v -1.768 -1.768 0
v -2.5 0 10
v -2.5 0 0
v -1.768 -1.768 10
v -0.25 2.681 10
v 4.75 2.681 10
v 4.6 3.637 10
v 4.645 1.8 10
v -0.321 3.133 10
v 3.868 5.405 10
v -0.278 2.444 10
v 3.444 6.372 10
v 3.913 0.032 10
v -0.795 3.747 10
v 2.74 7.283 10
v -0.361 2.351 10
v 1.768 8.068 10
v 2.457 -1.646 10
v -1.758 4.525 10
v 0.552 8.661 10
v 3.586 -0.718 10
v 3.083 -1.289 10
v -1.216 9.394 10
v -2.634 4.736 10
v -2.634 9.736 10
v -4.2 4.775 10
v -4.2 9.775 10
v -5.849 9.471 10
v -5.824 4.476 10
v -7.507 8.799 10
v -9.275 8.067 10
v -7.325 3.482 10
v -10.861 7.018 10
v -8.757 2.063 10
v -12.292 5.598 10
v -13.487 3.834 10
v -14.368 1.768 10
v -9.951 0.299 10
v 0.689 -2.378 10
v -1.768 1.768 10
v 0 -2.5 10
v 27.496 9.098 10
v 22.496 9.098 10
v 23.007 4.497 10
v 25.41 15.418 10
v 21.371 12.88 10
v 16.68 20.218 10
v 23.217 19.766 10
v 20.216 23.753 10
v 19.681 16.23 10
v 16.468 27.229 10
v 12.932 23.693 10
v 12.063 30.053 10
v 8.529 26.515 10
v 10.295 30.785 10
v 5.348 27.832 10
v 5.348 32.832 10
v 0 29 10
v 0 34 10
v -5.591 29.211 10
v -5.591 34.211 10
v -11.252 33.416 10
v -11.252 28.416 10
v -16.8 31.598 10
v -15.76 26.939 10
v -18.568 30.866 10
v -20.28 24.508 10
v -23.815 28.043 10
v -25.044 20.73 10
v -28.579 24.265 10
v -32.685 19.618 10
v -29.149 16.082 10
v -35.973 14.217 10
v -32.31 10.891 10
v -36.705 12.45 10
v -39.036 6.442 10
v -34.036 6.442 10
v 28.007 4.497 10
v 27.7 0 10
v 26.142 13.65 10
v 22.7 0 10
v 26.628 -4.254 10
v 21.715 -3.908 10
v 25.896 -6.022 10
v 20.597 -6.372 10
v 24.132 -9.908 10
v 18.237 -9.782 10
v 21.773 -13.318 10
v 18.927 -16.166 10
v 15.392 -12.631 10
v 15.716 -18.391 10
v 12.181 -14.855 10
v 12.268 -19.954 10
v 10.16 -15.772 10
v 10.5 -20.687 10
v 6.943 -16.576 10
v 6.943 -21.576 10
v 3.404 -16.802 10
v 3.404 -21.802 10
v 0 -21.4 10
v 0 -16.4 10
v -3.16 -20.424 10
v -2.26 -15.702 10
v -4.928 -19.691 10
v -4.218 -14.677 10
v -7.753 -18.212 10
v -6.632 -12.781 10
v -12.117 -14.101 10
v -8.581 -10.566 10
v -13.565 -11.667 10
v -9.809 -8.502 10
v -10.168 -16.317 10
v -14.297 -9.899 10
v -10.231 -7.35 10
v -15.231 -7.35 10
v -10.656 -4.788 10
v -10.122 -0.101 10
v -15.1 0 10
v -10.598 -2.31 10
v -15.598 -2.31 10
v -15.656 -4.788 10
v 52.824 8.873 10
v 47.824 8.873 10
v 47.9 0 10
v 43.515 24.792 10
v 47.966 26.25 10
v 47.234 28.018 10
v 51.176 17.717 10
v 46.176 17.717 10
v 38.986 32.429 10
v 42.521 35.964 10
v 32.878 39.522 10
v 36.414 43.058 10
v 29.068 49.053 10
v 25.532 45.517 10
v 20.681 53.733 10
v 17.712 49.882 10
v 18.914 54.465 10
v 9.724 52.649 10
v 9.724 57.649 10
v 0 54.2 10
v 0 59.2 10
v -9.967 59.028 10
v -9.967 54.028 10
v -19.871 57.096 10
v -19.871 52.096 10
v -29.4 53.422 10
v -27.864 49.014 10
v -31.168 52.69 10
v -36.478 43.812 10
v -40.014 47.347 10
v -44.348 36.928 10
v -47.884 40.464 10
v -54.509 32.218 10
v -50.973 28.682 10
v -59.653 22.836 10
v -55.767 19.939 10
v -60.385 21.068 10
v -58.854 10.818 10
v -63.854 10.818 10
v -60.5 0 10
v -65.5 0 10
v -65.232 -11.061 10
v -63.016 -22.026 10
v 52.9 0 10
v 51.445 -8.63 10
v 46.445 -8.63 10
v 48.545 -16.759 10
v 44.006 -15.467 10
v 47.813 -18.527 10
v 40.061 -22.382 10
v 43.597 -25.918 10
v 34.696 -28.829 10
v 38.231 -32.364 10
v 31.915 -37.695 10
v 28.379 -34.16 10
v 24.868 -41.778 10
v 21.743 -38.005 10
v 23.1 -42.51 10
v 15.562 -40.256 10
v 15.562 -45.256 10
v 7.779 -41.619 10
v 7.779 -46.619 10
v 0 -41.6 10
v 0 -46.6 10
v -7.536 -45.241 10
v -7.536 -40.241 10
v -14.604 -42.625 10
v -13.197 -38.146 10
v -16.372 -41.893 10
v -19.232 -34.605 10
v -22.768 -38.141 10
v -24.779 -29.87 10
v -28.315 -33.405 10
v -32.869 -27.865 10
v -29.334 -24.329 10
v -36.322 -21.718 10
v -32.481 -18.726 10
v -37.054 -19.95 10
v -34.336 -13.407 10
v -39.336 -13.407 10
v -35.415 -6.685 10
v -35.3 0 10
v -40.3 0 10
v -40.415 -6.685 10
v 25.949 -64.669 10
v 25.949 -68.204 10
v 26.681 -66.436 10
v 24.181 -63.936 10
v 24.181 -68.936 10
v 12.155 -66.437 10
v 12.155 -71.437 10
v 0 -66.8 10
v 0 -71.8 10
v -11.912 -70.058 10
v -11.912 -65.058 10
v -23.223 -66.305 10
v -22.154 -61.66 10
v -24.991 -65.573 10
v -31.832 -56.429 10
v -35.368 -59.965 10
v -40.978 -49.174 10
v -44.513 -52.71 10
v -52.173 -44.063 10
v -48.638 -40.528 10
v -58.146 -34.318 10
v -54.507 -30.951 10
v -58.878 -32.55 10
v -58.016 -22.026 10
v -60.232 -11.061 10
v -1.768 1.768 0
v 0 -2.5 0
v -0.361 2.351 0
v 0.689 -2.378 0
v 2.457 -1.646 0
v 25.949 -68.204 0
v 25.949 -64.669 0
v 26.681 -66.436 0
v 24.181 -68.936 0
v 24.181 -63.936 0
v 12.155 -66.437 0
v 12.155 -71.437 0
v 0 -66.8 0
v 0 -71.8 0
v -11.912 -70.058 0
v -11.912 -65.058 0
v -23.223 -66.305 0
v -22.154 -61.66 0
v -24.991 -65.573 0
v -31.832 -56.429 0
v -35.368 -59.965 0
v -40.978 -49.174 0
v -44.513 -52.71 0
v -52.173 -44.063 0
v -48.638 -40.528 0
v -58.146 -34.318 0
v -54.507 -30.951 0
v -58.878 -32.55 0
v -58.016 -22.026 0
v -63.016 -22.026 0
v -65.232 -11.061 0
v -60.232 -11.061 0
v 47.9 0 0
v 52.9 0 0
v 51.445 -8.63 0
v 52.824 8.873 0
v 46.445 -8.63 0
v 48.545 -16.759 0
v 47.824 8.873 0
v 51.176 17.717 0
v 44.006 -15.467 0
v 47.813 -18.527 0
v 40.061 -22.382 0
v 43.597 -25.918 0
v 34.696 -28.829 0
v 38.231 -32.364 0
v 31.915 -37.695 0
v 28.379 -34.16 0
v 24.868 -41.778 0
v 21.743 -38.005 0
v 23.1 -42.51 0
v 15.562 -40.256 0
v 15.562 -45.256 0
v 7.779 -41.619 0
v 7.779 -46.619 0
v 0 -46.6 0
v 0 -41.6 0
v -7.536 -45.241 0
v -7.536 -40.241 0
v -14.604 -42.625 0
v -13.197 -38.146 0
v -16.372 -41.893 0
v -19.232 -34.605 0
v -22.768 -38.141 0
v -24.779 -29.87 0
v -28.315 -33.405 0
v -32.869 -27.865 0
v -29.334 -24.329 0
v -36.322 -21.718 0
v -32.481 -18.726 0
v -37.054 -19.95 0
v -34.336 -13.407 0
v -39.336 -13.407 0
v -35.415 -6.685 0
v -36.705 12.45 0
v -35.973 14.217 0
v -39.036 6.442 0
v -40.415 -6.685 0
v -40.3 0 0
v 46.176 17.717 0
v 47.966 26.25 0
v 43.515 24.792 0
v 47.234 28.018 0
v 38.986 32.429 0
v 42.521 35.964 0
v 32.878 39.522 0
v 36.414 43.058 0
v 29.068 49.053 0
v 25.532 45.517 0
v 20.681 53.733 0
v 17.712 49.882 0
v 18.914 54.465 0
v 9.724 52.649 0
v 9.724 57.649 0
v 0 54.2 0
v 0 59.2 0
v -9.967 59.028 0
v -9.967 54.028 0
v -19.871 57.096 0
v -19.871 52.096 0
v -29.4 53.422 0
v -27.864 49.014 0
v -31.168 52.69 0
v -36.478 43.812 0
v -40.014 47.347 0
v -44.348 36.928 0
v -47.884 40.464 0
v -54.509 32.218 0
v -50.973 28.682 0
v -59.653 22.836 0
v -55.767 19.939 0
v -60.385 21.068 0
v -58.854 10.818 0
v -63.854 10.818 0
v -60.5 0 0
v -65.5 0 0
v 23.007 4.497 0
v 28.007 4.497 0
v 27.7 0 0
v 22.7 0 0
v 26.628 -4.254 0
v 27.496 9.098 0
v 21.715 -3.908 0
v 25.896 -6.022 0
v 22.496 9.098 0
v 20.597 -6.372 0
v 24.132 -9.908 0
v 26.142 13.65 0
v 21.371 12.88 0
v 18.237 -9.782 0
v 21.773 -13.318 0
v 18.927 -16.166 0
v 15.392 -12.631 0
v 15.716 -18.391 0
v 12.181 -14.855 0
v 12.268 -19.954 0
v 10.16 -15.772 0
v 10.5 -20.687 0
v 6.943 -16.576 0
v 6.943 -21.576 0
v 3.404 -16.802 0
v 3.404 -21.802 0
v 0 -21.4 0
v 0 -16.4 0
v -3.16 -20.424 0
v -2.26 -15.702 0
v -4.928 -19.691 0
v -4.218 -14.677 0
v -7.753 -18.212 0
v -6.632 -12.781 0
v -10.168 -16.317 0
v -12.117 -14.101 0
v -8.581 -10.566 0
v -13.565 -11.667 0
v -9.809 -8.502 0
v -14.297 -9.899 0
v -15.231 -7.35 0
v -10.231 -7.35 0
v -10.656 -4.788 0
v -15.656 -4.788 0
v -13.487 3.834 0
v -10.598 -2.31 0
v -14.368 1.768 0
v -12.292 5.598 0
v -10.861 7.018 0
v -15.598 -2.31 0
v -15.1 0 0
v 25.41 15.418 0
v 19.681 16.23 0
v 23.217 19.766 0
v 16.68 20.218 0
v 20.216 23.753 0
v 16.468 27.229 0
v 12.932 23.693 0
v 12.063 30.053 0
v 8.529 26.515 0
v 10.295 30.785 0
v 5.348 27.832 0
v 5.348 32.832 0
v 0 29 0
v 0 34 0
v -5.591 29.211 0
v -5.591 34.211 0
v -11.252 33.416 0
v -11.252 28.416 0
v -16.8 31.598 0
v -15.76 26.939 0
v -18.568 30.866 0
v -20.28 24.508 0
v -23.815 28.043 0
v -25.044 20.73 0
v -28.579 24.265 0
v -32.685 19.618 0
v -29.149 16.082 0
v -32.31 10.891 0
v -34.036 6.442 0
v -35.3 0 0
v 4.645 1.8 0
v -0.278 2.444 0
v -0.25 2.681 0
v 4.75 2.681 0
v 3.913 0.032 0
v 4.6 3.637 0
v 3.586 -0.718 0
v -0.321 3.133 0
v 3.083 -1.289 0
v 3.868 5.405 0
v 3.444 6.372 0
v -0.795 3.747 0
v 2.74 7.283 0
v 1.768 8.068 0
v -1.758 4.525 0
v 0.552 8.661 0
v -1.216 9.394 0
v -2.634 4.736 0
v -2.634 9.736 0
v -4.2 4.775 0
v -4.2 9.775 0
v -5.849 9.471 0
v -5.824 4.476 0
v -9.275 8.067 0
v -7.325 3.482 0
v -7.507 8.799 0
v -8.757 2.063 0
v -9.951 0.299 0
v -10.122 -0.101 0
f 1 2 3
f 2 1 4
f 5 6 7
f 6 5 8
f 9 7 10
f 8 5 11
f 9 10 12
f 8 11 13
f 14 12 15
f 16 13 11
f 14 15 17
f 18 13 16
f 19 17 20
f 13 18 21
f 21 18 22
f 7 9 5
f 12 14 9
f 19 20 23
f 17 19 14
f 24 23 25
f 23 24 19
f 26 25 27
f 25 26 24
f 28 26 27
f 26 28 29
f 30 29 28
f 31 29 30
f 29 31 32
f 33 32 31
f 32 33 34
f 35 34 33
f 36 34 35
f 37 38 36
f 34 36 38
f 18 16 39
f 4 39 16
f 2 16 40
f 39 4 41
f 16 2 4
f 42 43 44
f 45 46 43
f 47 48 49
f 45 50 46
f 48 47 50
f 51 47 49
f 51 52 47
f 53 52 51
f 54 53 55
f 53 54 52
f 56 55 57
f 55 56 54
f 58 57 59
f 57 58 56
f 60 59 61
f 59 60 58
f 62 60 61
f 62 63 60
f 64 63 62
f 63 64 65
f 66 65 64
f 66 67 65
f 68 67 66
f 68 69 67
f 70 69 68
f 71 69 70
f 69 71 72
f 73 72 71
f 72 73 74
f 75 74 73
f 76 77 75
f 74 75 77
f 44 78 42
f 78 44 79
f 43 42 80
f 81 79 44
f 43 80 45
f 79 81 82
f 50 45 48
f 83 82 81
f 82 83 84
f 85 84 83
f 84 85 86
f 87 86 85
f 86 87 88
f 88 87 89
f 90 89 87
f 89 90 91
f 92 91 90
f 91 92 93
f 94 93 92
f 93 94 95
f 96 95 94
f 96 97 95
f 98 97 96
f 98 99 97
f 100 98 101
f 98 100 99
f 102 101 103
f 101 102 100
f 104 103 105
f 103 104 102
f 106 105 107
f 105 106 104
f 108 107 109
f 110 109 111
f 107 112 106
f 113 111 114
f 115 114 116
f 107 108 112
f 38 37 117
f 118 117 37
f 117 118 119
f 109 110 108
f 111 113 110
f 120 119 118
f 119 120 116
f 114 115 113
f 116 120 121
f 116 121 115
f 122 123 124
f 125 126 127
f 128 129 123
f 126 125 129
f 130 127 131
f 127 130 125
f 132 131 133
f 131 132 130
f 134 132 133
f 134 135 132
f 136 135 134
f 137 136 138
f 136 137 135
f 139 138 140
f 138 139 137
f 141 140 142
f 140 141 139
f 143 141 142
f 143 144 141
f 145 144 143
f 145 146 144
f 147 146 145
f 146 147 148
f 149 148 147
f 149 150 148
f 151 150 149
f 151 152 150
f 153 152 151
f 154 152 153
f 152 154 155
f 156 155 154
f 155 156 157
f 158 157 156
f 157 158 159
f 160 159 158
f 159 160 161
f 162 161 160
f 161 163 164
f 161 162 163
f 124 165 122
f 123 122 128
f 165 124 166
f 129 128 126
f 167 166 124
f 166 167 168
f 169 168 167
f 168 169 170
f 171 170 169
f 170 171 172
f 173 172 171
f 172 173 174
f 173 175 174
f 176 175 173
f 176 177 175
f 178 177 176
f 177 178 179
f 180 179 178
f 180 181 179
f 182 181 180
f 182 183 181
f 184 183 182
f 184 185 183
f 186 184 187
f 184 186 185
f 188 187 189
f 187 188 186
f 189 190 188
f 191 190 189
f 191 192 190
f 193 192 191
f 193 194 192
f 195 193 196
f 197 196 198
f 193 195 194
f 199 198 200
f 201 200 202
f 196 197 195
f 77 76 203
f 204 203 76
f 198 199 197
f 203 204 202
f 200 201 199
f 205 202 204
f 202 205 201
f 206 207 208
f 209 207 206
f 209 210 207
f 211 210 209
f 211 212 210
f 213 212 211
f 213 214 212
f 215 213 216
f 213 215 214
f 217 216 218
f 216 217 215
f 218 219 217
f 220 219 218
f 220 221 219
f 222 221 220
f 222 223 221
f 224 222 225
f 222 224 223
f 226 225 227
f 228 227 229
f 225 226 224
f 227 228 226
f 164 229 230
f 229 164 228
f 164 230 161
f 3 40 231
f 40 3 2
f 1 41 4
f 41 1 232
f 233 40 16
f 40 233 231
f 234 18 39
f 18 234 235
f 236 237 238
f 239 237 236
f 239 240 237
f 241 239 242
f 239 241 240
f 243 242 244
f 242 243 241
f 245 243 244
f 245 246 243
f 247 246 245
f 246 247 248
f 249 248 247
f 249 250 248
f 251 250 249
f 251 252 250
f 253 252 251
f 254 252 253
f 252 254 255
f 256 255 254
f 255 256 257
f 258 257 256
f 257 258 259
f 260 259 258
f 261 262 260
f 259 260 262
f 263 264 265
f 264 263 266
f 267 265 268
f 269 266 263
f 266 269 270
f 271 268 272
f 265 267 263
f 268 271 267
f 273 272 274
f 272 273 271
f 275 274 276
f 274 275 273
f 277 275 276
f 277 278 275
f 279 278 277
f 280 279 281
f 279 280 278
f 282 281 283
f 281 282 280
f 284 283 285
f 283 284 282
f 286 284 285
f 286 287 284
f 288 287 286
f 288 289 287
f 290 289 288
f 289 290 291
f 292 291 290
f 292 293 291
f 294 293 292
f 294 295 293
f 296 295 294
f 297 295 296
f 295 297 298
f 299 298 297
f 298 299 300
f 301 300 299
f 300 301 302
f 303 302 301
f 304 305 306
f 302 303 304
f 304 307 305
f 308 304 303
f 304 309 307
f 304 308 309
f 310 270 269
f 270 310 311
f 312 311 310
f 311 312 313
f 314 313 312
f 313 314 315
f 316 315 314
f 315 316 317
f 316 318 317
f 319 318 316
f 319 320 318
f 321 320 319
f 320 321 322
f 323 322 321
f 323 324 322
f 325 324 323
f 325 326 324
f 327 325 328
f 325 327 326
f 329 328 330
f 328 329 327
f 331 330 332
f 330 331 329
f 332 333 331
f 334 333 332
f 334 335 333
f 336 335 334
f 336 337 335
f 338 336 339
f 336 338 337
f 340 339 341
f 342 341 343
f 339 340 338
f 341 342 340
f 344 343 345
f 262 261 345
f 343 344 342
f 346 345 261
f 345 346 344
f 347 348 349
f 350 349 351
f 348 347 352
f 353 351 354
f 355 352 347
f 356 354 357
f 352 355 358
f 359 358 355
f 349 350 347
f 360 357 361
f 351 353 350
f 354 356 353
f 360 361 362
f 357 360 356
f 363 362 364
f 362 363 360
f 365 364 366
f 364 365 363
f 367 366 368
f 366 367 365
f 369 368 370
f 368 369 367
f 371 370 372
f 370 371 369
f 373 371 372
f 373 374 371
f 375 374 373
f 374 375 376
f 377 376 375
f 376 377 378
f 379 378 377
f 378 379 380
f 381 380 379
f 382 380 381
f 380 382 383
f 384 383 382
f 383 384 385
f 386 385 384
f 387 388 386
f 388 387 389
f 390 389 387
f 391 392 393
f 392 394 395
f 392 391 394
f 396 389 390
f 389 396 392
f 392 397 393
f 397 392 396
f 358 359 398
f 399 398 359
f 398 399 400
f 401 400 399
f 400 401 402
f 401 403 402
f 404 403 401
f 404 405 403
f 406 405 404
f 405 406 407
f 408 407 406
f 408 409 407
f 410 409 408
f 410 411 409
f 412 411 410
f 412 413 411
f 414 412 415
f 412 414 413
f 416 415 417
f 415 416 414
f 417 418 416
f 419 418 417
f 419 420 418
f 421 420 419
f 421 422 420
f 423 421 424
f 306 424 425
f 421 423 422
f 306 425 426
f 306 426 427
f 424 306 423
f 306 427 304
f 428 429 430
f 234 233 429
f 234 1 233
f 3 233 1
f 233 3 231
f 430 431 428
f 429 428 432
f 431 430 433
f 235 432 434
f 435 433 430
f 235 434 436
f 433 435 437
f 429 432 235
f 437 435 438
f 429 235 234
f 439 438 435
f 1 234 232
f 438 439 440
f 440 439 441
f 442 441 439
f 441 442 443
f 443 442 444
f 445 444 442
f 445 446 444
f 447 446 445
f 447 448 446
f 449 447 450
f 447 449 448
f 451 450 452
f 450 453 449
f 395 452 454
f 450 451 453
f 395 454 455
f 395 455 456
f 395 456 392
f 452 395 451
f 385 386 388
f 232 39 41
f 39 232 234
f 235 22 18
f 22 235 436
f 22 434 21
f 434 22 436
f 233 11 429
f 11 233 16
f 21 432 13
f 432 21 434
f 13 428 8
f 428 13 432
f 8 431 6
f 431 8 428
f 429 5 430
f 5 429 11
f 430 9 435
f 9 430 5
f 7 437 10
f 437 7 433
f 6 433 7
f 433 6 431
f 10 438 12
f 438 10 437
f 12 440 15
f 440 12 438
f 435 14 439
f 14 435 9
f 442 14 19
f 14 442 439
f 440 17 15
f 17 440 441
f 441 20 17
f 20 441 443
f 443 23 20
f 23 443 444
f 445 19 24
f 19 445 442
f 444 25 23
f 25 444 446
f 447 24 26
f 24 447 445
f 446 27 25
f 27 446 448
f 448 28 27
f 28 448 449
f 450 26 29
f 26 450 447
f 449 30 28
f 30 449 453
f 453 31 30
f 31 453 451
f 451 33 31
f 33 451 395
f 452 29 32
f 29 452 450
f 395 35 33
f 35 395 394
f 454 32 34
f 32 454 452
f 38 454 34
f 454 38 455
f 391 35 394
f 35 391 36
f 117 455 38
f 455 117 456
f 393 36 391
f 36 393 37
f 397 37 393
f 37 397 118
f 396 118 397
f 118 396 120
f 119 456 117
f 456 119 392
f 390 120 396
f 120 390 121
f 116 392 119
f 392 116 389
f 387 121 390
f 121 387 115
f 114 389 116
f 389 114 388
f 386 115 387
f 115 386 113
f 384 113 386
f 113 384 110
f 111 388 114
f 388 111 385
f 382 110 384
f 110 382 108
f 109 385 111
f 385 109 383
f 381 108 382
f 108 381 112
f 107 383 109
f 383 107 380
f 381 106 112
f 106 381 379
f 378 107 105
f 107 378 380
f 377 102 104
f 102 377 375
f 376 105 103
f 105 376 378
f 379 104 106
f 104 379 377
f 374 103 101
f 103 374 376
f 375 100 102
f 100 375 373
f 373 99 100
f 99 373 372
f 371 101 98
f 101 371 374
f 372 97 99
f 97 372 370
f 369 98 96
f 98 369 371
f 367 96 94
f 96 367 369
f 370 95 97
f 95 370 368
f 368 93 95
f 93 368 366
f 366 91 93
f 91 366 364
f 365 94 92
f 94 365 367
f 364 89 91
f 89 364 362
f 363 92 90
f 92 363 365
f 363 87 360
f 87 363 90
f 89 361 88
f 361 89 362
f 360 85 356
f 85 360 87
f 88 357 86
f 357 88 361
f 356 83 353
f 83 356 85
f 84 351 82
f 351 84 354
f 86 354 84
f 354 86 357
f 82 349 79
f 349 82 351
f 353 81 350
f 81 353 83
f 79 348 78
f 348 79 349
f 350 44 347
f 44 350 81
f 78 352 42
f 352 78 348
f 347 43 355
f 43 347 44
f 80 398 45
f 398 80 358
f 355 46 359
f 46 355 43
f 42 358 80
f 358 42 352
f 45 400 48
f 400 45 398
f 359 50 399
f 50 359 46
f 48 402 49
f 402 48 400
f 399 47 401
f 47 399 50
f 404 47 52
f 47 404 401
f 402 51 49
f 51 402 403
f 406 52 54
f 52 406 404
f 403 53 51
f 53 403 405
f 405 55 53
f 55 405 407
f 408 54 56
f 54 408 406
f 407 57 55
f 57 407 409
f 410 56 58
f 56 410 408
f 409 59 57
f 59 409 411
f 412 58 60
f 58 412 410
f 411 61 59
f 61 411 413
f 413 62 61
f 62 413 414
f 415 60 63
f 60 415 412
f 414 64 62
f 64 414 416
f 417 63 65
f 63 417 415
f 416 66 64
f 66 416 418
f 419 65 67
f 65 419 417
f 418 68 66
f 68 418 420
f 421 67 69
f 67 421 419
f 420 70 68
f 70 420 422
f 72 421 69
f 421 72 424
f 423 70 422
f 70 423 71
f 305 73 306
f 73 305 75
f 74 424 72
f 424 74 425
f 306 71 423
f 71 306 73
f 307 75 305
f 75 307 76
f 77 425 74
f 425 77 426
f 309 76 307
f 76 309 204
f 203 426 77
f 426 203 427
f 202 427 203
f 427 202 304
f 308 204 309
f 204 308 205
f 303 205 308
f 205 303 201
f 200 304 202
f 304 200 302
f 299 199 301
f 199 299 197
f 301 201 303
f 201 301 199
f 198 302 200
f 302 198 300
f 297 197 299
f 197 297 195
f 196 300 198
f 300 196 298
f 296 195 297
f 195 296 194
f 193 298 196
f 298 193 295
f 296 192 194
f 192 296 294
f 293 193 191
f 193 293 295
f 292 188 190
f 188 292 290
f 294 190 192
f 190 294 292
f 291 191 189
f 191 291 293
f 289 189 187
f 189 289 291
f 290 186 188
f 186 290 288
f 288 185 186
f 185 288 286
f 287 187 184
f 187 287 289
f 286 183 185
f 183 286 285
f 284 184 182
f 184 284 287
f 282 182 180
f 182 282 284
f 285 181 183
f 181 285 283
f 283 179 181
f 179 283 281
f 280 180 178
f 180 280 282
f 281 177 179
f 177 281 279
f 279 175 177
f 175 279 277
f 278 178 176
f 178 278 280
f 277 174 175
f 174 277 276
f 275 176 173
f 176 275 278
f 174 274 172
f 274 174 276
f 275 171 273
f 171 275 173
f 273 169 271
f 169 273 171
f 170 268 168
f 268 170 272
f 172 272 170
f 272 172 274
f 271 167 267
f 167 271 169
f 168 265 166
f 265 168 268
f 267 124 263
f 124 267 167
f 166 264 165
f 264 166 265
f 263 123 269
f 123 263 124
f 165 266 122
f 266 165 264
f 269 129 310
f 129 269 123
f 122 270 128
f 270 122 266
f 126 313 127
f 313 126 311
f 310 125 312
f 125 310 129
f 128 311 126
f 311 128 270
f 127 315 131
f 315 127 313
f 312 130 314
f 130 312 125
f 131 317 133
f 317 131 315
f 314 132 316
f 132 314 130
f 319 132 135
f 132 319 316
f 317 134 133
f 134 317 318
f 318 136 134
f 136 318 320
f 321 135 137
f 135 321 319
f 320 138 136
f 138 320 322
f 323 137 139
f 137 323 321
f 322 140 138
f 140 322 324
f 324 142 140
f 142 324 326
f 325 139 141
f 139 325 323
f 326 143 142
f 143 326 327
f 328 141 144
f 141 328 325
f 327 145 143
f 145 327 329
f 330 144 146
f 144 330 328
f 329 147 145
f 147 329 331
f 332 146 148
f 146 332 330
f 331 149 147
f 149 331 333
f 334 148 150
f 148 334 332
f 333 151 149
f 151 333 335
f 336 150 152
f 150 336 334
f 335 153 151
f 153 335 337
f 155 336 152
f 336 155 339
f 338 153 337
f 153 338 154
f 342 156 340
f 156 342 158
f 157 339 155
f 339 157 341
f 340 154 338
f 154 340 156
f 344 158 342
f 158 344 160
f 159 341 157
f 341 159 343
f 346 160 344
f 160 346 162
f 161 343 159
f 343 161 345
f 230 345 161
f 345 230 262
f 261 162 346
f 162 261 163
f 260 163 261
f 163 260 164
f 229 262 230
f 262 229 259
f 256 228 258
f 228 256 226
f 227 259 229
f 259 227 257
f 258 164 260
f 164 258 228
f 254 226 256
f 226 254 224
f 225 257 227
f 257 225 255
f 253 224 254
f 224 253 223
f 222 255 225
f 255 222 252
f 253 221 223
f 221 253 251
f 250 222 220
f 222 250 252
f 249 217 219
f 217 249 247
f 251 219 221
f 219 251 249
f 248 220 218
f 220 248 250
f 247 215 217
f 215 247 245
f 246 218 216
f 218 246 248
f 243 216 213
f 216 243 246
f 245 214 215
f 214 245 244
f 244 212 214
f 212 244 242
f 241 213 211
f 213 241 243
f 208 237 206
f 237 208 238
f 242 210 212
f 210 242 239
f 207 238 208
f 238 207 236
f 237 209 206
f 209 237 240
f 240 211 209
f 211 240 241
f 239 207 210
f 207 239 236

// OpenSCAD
//http://www.wolframalpha.com/input/?i=Archimedes%E2%80%99+spiral

spirals = 1;
a = 0.07;
incrementBy = 10;
height = 10;
wallThickness = 5;

for(i=[0:360/spirals:360])
rotate([0,0,i])
for(t=[0:incrementBy:1000])
hull(){

translate([a*t*cos(t),a*t*sin(t),0])
cylinder(r=wallThickness/2,h=height);

translate([a*(t+incrementBy)*cos(t+incrementBy),a*(t+incrementBy)*sin(t+incrementBy),0])
cylinder(r=wallThickness/2,h=height);
}
